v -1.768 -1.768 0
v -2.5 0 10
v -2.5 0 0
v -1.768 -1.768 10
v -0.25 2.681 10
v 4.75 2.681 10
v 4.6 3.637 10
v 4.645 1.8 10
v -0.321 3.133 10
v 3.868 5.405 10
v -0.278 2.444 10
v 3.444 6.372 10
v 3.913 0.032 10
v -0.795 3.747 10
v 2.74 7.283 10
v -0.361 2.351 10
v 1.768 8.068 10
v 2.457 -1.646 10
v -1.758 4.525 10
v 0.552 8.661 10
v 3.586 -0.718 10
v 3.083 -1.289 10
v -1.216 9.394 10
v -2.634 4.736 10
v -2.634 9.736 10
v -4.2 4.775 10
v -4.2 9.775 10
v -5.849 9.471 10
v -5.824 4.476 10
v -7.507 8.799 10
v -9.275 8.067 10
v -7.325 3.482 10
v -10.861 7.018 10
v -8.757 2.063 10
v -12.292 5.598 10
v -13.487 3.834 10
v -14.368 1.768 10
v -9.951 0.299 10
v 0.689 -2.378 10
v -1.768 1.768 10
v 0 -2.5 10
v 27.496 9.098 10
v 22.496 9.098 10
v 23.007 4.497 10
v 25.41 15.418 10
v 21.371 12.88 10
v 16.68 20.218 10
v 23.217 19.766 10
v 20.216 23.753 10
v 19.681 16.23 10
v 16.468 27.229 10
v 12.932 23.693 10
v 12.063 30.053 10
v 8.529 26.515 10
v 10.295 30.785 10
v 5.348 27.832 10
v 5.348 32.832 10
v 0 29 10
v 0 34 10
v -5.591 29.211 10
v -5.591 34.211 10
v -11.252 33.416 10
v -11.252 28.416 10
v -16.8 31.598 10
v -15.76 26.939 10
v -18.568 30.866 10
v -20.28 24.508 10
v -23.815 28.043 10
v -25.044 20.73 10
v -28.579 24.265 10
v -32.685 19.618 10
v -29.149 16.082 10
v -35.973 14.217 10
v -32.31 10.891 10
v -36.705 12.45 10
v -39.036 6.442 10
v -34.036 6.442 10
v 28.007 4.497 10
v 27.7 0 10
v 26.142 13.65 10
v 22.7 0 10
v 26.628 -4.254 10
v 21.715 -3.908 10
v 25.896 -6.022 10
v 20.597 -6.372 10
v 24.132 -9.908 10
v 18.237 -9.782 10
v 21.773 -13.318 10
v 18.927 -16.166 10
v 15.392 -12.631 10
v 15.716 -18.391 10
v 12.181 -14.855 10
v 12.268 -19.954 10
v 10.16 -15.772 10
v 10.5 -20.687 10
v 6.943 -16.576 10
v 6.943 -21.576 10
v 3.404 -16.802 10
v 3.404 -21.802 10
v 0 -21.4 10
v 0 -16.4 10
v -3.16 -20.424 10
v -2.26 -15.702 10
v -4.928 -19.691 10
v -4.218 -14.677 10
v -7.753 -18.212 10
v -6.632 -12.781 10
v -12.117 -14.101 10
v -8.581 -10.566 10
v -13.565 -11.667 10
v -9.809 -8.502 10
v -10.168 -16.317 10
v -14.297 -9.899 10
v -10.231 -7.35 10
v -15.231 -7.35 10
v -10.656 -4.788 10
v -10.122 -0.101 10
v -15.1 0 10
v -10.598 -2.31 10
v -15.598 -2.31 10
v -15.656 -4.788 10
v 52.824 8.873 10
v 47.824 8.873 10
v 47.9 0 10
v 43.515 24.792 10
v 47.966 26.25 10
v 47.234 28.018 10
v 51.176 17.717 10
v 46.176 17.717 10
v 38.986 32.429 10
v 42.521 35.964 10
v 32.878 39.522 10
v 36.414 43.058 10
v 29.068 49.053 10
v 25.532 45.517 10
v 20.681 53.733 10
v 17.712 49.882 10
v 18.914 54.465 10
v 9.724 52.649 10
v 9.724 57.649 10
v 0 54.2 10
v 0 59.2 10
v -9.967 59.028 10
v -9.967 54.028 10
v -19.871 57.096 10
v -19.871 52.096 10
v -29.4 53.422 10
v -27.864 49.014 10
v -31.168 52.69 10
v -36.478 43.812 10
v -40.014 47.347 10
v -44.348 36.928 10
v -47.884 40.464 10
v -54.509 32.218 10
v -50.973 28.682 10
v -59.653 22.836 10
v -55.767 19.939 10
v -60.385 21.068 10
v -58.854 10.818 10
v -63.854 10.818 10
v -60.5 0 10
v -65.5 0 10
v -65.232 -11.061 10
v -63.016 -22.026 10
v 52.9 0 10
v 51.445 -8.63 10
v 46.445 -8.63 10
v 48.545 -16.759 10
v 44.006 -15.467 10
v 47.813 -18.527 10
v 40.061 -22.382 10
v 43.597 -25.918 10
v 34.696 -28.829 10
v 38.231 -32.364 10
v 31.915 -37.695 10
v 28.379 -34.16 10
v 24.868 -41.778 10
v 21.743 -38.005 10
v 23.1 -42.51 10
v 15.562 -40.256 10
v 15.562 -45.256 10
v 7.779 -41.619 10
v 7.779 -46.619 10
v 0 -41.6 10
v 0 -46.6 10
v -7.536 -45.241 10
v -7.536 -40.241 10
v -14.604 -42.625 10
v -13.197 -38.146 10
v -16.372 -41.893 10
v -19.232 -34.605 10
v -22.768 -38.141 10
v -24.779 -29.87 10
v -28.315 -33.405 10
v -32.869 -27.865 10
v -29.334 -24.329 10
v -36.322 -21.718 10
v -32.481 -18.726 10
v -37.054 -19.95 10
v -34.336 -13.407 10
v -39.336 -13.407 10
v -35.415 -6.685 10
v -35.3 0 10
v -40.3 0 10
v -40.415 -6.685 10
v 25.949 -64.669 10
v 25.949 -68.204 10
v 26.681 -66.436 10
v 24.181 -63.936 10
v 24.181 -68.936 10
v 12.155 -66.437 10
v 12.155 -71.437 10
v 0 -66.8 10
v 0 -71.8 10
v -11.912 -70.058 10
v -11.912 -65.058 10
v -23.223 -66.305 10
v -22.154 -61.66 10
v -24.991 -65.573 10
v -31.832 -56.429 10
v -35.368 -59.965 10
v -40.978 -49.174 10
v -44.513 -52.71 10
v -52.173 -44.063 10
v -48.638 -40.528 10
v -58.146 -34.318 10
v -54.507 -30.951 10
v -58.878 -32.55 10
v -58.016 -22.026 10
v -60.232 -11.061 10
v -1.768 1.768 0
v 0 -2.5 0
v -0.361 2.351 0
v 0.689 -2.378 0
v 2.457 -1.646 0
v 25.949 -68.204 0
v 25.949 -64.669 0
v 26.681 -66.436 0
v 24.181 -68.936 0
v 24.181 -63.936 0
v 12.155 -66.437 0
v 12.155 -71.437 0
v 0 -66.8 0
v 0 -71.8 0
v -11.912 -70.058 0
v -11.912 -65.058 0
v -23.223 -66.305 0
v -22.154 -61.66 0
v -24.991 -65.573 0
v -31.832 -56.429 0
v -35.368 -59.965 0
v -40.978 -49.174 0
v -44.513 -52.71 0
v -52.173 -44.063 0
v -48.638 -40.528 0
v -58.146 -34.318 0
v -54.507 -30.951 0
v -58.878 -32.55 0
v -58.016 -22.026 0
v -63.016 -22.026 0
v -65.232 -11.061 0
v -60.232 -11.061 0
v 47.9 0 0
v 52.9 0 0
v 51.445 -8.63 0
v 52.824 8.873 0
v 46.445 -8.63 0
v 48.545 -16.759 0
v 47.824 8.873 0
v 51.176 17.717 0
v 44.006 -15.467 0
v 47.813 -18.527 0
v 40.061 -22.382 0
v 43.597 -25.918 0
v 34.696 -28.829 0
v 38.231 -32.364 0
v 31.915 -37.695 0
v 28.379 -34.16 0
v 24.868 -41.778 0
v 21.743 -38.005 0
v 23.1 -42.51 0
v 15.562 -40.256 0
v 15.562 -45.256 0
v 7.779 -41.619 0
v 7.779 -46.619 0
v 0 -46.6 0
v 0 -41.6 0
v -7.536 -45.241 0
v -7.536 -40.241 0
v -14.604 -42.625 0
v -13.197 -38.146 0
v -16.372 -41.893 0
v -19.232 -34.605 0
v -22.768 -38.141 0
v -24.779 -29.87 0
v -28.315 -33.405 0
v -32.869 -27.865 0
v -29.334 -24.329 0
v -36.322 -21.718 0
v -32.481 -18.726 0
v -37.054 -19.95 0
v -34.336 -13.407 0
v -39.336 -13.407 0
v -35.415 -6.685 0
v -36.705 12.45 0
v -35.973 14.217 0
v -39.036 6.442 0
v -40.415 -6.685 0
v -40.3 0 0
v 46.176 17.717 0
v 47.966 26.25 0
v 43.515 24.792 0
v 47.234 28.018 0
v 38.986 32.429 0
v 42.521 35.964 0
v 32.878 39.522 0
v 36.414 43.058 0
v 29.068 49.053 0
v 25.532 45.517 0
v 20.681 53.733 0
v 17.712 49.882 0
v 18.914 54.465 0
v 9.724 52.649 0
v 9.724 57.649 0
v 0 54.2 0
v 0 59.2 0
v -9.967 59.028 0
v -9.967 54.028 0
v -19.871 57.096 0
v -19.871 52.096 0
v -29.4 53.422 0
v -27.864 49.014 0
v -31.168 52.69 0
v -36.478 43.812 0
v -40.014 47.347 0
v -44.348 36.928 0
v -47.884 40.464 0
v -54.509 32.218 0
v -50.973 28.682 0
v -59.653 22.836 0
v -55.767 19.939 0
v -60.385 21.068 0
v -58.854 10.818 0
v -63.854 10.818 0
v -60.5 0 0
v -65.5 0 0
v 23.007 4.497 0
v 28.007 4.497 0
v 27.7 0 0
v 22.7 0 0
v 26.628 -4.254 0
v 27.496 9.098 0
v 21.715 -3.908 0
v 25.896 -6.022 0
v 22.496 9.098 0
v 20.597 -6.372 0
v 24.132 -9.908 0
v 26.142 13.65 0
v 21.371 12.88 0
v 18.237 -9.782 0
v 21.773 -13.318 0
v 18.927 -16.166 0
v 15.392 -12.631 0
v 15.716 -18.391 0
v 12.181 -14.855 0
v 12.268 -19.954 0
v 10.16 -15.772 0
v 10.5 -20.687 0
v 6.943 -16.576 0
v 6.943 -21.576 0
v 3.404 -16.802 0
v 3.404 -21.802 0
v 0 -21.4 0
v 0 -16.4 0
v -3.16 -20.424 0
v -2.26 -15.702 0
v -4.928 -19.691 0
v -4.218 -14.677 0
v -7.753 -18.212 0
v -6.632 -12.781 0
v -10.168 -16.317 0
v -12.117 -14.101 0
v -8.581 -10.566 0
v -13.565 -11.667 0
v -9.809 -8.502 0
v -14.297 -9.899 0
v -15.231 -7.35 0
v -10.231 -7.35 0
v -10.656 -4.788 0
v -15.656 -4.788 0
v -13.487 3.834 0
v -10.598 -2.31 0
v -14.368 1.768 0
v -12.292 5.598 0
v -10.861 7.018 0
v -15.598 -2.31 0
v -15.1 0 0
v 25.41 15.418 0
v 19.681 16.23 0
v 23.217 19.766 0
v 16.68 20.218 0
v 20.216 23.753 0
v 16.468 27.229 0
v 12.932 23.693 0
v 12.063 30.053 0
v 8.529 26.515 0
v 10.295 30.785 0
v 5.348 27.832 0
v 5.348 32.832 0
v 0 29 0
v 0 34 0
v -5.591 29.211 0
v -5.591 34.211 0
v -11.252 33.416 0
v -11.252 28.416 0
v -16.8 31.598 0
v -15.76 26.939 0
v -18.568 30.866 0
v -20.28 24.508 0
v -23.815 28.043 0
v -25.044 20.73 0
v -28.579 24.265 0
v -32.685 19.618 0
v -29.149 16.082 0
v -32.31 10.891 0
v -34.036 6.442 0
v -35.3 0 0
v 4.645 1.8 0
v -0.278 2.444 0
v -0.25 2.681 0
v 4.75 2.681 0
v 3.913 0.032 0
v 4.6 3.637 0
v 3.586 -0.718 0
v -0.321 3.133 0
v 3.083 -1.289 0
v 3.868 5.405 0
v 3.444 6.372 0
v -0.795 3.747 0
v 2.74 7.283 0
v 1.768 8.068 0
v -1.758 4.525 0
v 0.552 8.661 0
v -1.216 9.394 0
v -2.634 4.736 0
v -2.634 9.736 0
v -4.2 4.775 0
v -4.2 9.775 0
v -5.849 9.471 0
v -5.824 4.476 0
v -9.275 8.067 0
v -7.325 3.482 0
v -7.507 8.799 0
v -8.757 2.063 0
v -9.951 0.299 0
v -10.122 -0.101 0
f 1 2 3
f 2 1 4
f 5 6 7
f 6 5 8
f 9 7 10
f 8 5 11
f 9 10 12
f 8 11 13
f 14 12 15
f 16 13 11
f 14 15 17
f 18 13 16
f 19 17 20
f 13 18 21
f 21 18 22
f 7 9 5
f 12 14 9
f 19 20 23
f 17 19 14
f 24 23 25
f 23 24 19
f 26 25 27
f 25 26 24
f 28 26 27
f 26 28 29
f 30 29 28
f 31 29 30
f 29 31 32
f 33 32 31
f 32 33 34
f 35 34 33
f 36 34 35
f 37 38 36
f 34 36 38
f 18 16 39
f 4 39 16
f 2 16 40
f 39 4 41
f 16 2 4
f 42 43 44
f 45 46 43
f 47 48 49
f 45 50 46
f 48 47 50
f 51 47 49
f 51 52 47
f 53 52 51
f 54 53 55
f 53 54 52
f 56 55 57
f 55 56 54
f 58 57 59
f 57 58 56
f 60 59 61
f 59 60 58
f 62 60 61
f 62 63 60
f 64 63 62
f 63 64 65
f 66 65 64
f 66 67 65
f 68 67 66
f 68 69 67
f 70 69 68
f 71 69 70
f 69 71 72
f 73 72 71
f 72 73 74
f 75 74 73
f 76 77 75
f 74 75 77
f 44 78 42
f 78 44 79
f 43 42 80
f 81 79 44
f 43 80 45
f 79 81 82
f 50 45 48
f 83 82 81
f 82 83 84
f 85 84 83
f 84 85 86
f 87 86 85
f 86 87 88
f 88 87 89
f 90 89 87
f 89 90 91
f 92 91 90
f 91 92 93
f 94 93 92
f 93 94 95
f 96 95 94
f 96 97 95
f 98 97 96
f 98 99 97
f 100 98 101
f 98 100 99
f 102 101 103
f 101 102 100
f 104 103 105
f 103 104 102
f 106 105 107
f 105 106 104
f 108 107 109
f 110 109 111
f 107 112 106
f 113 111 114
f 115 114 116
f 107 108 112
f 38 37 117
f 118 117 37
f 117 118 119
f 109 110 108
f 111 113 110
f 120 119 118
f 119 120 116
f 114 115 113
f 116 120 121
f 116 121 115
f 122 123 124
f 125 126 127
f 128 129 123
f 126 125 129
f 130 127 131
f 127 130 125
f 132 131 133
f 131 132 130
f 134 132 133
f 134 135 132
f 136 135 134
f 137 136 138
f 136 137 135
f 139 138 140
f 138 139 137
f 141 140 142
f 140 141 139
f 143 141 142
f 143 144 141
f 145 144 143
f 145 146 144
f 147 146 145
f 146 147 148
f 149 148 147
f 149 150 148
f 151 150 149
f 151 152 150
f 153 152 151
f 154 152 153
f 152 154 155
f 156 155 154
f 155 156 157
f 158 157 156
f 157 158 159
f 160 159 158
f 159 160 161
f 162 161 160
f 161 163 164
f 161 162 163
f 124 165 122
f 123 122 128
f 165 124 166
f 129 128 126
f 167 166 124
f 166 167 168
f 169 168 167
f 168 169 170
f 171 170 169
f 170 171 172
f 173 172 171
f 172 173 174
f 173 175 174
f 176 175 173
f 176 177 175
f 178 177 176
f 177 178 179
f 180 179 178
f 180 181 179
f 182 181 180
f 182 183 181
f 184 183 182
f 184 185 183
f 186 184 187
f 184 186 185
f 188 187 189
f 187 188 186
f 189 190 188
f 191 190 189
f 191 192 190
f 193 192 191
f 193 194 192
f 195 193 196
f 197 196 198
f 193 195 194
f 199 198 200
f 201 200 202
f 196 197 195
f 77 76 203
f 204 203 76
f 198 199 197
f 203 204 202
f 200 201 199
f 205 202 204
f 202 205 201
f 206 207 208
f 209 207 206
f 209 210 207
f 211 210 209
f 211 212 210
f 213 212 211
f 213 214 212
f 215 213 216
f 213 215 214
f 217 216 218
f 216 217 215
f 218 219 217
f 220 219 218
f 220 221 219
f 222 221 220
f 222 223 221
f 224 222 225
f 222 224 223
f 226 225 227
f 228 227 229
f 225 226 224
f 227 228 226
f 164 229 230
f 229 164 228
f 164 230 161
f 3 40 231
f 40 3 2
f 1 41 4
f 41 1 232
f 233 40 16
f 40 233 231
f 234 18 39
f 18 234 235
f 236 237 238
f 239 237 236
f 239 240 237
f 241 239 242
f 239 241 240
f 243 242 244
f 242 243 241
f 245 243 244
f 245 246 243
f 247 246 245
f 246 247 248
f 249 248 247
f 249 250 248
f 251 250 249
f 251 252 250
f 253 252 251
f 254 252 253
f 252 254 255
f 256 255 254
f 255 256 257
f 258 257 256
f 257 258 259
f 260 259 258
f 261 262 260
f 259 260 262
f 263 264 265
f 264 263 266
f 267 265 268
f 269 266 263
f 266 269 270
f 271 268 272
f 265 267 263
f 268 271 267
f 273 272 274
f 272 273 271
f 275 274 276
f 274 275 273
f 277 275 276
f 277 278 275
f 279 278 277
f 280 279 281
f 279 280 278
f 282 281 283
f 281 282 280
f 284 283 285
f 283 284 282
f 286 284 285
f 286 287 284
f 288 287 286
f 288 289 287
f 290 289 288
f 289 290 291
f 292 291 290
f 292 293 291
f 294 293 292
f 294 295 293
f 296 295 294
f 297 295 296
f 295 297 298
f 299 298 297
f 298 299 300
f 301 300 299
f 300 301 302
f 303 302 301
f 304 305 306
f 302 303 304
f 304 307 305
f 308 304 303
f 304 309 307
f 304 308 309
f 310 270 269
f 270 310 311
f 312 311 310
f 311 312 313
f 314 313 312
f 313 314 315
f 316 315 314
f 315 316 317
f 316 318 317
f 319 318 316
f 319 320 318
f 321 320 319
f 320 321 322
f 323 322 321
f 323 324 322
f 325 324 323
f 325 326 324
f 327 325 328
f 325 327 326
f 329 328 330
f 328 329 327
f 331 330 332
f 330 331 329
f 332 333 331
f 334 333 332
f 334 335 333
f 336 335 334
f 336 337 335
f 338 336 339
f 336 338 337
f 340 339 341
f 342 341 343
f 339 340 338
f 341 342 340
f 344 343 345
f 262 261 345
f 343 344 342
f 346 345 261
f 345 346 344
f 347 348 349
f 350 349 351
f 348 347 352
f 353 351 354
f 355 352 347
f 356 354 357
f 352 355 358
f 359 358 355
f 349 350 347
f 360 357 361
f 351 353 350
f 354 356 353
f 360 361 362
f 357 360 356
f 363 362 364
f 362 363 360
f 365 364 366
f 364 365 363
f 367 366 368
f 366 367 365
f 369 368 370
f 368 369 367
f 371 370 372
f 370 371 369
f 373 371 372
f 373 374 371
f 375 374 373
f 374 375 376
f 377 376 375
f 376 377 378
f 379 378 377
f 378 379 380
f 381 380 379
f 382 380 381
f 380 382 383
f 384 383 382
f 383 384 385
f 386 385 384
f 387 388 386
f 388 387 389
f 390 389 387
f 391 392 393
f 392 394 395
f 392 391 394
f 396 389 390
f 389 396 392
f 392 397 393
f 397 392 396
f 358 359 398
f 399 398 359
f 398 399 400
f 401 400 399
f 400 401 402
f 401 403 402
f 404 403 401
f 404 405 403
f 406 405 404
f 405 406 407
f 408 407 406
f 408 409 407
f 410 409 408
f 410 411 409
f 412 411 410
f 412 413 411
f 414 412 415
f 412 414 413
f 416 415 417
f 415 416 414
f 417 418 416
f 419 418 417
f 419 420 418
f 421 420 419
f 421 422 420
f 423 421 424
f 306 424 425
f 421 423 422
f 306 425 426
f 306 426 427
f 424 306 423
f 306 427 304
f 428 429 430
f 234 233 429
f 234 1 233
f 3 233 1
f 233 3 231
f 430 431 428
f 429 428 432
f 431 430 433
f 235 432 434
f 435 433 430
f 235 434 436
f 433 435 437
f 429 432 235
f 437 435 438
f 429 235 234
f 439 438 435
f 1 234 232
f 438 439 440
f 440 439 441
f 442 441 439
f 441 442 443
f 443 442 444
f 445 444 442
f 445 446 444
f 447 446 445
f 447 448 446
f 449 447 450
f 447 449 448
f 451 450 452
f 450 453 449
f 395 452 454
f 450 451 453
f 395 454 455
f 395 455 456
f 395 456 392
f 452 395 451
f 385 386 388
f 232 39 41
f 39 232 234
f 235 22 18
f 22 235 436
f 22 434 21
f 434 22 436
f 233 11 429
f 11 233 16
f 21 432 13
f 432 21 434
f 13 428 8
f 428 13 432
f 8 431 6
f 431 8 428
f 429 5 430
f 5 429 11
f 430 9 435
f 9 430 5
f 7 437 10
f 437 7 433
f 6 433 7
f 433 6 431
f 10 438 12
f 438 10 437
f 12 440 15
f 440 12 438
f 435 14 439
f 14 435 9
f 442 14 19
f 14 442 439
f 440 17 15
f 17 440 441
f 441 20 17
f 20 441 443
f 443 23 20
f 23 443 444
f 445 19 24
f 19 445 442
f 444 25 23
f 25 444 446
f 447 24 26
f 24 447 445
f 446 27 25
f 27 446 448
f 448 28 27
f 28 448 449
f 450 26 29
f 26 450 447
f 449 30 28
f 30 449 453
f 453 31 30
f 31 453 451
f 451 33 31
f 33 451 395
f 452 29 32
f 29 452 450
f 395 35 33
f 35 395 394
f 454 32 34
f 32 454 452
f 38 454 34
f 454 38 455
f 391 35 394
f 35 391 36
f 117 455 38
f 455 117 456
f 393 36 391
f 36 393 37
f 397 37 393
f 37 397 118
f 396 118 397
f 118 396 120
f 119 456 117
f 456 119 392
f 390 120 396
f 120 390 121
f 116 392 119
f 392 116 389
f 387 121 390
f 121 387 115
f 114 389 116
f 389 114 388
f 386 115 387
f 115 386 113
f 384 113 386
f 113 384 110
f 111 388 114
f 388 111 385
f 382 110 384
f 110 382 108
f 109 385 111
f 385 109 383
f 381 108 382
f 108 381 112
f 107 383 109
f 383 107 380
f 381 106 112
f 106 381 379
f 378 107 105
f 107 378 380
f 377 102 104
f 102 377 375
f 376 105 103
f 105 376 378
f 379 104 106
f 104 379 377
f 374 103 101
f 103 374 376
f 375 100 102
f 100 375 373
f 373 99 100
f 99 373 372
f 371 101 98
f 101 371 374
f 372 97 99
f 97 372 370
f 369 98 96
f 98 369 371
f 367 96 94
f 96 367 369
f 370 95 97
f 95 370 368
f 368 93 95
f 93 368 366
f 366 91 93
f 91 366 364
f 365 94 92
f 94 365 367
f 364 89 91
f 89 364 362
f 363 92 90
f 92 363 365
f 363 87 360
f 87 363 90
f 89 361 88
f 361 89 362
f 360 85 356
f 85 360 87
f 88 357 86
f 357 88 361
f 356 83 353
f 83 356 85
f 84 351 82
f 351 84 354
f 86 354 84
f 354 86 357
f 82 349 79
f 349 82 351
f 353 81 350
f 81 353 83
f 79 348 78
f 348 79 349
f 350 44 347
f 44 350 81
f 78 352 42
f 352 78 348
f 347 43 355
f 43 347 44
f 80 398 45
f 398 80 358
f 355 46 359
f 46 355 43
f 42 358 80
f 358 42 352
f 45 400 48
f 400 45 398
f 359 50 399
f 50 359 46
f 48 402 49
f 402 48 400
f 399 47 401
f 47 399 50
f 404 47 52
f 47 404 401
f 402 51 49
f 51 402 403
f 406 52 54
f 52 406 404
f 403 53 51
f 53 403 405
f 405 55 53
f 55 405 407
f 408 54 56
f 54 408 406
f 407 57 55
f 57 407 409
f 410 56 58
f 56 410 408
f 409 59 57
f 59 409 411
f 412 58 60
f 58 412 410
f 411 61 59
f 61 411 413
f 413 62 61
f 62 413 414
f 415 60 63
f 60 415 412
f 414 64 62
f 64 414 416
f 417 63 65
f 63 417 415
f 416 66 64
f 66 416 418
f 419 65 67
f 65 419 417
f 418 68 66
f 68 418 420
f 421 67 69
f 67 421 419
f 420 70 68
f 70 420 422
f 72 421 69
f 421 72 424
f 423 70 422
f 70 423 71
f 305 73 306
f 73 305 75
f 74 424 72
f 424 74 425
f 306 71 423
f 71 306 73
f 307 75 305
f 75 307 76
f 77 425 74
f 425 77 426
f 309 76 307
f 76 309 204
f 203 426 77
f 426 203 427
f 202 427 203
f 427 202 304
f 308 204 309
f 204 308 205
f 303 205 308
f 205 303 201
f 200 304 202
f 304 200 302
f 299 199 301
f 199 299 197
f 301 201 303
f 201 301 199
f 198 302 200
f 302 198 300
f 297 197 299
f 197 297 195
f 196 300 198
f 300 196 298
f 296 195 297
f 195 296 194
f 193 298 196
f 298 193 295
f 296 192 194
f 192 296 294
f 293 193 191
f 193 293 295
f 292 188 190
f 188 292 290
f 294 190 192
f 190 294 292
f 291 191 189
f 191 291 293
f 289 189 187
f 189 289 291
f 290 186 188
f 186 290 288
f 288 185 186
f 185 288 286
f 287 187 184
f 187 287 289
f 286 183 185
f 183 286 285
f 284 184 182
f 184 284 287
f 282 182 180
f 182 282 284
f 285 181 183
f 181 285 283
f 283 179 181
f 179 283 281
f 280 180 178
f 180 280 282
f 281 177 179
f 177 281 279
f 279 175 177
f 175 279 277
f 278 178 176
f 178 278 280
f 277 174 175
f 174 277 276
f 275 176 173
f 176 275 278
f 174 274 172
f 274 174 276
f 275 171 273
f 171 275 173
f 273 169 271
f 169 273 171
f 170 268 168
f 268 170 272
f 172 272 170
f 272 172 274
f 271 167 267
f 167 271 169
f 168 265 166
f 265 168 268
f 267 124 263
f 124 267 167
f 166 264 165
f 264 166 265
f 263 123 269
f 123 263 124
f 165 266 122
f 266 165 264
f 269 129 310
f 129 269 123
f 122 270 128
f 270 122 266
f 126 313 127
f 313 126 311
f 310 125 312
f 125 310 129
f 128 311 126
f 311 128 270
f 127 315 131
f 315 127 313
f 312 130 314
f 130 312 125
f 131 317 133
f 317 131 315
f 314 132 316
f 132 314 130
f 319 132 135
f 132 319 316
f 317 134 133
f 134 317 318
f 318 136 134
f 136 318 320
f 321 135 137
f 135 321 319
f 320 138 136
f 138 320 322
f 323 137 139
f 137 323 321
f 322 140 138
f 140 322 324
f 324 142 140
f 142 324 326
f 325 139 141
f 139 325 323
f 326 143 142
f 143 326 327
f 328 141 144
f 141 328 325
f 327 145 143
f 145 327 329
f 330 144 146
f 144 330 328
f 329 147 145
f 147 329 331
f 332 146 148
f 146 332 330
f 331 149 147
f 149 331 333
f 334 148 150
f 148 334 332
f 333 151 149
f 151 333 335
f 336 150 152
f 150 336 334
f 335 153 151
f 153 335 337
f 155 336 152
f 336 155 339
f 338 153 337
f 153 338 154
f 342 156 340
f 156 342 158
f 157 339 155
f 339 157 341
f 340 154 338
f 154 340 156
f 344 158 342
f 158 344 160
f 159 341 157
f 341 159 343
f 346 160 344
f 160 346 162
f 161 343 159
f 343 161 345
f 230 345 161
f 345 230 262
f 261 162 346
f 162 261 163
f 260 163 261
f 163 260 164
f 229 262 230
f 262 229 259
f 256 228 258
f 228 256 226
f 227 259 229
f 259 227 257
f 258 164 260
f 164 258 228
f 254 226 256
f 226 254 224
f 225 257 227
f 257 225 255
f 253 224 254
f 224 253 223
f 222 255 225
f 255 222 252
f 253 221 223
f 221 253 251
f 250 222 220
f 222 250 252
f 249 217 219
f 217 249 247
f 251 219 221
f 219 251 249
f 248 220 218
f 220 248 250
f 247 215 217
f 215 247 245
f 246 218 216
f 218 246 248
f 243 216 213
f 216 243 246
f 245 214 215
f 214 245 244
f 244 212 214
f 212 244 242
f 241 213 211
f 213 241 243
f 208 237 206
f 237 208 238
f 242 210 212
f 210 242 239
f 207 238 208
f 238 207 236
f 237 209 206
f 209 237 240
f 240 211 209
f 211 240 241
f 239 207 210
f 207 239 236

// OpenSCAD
//http://www.wolframalpha.com/input/?i=Archimedes%E2%80%99+spiral

spirals = 1;
a = 0.07;
incrementBy = 10;
height = 10;
wallThickness = 5;

for(i=[0:360/spirals:360])
rotate([0,0,i])
for(t=[0:incrementBy:1000])
hull(){

translate([a*t*cos(t),a*t*sin(t),0])
cylinder(r=wallThickness/2,h=height);

translate([a*(t+incrementBy)*cos(t+incrementBy),a*(t+incrementBy)*sin(t+incrementBy),0])
cylinder(r=wallThickness/2,h=height);
}
